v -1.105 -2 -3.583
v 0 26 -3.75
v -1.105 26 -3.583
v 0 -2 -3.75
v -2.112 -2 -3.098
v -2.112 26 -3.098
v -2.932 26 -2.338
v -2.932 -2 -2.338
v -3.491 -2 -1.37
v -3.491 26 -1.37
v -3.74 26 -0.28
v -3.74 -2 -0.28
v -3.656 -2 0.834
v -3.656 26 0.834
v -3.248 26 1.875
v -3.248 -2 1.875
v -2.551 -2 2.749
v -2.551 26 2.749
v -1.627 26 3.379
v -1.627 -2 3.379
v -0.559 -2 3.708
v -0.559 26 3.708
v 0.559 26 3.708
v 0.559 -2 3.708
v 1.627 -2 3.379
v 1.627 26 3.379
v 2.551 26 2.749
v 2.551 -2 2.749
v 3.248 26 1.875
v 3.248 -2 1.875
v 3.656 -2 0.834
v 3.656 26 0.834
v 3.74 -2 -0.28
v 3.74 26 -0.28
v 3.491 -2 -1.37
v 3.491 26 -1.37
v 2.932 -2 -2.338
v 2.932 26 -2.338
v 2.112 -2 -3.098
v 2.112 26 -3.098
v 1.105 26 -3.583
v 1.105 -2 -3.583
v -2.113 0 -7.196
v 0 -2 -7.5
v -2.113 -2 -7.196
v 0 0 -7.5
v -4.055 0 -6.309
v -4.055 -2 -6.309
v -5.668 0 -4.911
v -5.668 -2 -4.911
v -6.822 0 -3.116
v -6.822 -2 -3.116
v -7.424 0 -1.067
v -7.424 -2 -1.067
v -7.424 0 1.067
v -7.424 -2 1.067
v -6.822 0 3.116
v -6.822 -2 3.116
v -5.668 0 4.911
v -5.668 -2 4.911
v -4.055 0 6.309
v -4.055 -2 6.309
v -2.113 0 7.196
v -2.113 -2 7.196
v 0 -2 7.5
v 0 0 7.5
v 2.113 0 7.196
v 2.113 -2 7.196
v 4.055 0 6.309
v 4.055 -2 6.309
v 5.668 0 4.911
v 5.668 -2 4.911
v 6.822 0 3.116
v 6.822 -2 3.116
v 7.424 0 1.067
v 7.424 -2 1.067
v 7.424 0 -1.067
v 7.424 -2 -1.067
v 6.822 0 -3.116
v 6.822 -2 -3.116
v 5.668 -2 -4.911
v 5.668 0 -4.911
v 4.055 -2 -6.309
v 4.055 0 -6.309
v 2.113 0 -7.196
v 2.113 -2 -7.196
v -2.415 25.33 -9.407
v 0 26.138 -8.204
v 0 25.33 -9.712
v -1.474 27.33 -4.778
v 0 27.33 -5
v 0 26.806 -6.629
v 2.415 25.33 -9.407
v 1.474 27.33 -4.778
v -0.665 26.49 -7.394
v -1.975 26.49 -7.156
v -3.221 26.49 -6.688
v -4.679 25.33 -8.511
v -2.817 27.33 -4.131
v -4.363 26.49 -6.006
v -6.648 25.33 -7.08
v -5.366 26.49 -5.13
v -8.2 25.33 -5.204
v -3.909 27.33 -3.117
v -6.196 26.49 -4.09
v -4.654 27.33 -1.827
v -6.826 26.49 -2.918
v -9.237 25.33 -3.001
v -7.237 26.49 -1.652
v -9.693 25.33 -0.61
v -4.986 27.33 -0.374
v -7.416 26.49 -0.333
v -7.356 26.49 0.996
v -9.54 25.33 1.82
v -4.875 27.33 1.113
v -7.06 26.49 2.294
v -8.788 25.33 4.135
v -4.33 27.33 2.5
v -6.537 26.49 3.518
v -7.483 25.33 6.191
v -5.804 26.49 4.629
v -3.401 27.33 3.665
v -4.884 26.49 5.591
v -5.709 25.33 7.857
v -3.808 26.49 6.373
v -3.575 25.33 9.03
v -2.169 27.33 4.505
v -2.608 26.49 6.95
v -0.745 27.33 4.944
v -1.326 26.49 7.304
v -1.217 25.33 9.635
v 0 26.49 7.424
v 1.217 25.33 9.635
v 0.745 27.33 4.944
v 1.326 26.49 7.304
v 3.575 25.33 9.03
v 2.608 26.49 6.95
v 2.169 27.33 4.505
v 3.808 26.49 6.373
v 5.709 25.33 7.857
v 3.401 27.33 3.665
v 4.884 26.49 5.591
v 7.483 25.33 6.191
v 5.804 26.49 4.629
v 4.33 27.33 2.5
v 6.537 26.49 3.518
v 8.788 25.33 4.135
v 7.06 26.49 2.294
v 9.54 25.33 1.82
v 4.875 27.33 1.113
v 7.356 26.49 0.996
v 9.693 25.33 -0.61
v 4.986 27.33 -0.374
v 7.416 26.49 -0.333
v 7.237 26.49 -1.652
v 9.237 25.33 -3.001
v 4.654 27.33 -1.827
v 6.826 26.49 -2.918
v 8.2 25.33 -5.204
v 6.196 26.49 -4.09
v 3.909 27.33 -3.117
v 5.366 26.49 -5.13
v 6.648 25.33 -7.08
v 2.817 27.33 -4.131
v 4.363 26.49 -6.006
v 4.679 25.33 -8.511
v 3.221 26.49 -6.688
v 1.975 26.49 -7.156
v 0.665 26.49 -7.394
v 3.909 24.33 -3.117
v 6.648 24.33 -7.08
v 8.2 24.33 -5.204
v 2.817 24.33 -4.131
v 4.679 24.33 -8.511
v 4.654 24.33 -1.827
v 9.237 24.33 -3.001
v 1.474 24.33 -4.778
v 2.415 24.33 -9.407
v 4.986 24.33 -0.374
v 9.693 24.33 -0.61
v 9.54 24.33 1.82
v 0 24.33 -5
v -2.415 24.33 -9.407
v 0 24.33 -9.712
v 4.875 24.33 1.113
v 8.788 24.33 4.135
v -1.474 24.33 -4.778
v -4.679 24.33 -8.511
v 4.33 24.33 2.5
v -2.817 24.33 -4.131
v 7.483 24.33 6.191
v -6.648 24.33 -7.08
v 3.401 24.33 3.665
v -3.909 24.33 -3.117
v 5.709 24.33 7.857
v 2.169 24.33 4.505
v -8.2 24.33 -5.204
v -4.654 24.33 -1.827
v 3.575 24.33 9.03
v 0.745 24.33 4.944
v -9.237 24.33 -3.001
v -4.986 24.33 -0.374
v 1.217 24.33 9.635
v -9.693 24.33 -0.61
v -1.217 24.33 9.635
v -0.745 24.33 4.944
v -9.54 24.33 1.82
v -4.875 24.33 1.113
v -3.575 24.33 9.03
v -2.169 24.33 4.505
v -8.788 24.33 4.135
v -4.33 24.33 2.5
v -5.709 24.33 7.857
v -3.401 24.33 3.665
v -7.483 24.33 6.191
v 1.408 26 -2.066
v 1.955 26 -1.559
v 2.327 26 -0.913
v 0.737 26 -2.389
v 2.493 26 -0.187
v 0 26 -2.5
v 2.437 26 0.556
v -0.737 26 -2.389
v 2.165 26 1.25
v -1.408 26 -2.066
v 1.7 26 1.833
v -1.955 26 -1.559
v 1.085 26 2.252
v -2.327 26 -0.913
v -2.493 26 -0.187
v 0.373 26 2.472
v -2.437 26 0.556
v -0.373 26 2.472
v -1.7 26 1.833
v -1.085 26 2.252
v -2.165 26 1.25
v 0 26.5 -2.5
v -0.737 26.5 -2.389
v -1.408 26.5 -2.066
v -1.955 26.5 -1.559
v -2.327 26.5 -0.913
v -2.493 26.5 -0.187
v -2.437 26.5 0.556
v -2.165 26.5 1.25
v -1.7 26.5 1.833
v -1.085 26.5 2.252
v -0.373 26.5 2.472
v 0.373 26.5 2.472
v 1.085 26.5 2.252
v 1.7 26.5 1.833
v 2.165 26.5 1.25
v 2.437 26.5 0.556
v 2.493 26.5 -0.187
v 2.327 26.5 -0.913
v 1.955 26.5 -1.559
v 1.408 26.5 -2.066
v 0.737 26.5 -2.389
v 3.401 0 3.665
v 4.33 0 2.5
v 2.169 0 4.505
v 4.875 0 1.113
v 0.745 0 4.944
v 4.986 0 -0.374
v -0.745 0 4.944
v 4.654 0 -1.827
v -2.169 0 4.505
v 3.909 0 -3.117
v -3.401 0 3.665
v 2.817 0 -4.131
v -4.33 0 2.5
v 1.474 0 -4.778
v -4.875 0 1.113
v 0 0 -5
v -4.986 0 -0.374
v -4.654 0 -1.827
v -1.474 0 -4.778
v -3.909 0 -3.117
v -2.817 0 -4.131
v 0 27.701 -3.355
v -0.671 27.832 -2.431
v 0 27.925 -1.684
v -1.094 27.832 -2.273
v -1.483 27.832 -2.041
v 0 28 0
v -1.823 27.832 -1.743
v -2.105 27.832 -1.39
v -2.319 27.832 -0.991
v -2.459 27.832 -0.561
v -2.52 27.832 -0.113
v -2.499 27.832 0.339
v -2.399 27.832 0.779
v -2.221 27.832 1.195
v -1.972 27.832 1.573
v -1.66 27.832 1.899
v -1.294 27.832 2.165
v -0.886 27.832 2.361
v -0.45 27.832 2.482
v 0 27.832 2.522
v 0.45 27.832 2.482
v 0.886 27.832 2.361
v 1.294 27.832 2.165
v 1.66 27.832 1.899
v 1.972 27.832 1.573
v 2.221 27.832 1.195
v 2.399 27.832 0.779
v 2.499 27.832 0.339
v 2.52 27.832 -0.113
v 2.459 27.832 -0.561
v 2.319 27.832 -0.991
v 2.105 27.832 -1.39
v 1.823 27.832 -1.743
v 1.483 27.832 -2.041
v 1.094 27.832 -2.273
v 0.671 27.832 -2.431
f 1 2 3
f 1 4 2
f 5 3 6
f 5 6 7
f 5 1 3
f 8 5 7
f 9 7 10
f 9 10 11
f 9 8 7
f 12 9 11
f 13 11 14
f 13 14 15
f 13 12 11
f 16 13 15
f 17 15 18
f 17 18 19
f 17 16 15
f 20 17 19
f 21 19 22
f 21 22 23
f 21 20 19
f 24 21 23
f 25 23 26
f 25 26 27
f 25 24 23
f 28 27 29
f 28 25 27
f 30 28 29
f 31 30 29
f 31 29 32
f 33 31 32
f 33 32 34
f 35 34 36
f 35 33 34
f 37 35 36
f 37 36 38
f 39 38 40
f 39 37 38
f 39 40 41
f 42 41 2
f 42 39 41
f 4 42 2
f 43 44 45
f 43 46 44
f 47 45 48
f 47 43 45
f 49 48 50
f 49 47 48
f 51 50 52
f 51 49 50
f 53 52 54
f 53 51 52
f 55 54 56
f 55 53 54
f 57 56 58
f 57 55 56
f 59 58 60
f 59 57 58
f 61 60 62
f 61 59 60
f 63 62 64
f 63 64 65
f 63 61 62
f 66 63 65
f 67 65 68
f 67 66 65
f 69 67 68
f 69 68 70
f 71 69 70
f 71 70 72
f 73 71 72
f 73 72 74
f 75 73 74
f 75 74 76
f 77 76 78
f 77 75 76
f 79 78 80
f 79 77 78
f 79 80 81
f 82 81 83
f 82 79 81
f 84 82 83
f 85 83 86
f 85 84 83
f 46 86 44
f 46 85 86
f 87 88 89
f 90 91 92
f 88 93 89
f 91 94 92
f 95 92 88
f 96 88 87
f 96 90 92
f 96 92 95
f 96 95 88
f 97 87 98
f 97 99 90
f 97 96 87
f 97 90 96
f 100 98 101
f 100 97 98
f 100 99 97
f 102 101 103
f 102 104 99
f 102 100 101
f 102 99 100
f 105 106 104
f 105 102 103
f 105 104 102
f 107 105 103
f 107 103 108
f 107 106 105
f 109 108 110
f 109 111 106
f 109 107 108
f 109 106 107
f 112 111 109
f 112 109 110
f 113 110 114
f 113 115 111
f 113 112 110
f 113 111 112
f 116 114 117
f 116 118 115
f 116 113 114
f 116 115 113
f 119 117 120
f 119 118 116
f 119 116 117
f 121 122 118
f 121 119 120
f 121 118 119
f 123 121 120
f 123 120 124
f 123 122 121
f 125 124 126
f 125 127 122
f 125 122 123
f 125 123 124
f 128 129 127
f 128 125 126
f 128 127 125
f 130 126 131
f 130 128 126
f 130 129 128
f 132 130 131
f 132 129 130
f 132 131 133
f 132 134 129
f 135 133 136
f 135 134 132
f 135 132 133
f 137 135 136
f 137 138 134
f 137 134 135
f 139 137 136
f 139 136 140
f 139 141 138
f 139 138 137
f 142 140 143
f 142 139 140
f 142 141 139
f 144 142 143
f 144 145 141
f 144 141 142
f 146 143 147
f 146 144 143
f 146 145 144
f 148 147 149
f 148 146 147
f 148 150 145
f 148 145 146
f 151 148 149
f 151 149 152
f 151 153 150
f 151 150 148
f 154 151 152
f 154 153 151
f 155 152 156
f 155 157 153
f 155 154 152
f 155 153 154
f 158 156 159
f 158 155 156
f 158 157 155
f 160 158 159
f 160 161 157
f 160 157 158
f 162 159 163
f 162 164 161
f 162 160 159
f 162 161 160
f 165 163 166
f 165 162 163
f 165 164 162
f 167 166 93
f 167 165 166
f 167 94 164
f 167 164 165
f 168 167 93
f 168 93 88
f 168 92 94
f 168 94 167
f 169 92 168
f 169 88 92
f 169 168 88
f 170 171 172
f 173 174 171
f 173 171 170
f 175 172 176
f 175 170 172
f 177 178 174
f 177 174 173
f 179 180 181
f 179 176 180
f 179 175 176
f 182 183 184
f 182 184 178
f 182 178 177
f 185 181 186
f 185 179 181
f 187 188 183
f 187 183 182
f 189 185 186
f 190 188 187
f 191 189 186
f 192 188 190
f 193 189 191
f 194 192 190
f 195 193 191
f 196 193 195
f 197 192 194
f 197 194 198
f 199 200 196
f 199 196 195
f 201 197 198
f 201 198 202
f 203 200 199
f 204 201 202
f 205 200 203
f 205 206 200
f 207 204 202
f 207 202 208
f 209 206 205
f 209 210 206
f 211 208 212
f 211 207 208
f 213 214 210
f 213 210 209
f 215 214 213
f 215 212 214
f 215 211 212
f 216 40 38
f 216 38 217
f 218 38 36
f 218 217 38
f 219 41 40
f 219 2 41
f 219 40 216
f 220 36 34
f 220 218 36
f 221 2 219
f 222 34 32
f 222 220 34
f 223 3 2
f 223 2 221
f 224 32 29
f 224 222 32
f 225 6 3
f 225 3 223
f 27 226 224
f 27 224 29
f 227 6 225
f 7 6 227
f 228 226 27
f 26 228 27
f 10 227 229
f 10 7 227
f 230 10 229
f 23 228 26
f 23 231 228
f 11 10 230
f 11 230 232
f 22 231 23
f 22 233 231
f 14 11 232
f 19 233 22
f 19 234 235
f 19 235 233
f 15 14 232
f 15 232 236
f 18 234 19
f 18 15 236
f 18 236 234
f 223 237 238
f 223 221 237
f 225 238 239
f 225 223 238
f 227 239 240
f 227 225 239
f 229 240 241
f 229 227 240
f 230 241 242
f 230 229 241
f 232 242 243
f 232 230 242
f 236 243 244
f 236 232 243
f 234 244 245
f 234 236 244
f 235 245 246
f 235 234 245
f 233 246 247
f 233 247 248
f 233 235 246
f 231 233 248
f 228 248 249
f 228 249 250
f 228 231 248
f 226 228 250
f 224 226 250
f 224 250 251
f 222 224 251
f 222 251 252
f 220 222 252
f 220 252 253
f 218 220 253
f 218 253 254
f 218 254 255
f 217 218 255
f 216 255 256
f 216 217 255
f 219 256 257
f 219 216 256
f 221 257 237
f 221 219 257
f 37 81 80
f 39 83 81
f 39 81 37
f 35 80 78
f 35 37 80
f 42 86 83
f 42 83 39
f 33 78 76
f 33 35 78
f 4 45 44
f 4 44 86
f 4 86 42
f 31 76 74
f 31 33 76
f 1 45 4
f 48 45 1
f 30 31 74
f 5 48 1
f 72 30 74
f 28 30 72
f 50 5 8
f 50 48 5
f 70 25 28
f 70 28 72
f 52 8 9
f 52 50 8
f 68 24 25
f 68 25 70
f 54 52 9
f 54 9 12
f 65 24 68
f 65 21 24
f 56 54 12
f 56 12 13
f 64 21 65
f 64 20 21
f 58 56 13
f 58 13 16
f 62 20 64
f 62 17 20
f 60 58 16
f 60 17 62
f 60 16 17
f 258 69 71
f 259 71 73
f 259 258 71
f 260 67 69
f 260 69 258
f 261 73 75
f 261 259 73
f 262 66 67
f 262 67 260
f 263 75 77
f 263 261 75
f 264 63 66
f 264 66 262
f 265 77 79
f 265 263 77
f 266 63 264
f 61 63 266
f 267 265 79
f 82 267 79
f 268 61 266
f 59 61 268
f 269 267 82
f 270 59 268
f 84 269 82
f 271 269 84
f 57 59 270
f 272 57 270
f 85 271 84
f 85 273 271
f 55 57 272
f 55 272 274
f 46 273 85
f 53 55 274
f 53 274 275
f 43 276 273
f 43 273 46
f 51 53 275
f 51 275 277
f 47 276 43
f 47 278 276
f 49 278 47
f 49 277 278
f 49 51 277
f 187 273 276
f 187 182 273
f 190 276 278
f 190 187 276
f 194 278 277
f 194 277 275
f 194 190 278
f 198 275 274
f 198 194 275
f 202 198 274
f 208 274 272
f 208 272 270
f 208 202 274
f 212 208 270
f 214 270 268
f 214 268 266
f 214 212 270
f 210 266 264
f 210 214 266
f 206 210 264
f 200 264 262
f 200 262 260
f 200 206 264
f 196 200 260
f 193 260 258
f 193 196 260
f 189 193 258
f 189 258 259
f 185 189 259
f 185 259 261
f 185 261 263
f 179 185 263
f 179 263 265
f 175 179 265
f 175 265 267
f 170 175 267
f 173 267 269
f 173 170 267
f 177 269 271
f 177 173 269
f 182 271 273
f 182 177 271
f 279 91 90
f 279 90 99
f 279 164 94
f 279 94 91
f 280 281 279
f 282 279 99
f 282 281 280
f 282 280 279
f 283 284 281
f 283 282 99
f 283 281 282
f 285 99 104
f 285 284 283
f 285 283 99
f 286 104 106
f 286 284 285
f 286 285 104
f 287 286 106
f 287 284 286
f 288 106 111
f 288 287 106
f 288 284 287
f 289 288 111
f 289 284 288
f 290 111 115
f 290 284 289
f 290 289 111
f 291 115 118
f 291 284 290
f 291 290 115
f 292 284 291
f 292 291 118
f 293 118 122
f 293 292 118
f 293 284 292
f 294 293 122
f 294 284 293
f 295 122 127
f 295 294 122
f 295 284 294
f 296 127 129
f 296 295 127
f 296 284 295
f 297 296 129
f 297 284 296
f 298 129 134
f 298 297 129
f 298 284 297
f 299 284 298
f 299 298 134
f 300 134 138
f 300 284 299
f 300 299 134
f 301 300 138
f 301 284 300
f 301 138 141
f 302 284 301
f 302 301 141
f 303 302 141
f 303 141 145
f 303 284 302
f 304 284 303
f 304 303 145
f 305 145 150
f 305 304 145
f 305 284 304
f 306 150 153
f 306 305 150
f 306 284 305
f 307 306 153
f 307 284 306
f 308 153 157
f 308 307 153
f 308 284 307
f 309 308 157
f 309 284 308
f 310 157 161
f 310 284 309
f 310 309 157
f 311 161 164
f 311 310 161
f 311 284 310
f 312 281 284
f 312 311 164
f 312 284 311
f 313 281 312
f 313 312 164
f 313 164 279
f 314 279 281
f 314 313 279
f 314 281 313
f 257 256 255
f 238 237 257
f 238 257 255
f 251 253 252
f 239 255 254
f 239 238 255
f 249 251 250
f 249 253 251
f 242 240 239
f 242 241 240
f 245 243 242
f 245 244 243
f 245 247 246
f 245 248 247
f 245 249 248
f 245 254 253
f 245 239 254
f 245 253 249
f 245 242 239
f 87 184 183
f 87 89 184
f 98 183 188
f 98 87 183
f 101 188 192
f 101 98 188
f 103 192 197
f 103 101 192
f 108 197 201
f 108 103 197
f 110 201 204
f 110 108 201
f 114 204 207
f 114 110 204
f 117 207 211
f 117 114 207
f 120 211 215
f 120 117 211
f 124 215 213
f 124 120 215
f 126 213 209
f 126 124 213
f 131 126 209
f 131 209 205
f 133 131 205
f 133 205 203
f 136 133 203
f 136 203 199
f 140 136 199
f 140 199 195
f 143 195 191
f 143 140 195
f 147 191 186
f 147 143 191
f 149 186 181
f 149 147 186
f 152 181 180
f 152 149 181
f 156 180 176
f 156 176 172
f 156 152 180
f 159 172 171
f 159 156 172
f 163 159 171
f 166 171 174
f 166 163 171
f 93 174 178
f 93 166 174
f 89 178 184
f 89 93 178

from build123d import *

# Parameters (mm, degrees)
SKETCH_1_W = 4.711910786
SKETCH_1_H = 1


with BuildPart() as part:
    # Эскиз1 → Повернуть1 (revolve)
    with BuildSketch(Plane.XY, mode=Mode.PRIVATE) as revolve_1_sk:
        with BuildLine():
            Line((7.5, 0), (5, 0))
            Line((5, 0), (5, 24.33030278))
            Line((5, 24.33030278), (5, 25.33030278))
            Line((5, 25.33030278), (5, 27.33030278))
            ThreePointArc((5, 27.33030278), (2.522325037, 27.831831467), (0, 28))
            Line((0, 28), (0, 26.5))
            Line((0, 26.5), (2.5, 26.5))
            Line((2.5, 26.5), (2.5, 26))
            Line((2.5, 26), (3.75, 26))
            Line((3.75, 26), (3.75, -2))
            Line((3.75, -2), (7.5, -2))
            Line((7.5, -2), (7.5, 0))
        make_face()
        with BuildLine():
            Line((5, 27.33030278), (5, 25.33030278))
            Line((5, 25.33030278), (9.711910786, 25.33030278))
            ThreePointArc((9.711910786, 25.33030278), (7.423616352, 26.489708981), (5, 27.33030278))
        make_face()
        with Locations((7.355955393, 24.83030278)):
            Rectangle(SKETCH_1_W, SKETCH_1_H)
    revolve(revolve_1_sk.sketch.rotate(Axis((0, -22.043249972, 0), (0, 1, 0)), 90), axis=Axis((0, -22.043249972, 0), (0, 1, 0)))


solid = part.part
